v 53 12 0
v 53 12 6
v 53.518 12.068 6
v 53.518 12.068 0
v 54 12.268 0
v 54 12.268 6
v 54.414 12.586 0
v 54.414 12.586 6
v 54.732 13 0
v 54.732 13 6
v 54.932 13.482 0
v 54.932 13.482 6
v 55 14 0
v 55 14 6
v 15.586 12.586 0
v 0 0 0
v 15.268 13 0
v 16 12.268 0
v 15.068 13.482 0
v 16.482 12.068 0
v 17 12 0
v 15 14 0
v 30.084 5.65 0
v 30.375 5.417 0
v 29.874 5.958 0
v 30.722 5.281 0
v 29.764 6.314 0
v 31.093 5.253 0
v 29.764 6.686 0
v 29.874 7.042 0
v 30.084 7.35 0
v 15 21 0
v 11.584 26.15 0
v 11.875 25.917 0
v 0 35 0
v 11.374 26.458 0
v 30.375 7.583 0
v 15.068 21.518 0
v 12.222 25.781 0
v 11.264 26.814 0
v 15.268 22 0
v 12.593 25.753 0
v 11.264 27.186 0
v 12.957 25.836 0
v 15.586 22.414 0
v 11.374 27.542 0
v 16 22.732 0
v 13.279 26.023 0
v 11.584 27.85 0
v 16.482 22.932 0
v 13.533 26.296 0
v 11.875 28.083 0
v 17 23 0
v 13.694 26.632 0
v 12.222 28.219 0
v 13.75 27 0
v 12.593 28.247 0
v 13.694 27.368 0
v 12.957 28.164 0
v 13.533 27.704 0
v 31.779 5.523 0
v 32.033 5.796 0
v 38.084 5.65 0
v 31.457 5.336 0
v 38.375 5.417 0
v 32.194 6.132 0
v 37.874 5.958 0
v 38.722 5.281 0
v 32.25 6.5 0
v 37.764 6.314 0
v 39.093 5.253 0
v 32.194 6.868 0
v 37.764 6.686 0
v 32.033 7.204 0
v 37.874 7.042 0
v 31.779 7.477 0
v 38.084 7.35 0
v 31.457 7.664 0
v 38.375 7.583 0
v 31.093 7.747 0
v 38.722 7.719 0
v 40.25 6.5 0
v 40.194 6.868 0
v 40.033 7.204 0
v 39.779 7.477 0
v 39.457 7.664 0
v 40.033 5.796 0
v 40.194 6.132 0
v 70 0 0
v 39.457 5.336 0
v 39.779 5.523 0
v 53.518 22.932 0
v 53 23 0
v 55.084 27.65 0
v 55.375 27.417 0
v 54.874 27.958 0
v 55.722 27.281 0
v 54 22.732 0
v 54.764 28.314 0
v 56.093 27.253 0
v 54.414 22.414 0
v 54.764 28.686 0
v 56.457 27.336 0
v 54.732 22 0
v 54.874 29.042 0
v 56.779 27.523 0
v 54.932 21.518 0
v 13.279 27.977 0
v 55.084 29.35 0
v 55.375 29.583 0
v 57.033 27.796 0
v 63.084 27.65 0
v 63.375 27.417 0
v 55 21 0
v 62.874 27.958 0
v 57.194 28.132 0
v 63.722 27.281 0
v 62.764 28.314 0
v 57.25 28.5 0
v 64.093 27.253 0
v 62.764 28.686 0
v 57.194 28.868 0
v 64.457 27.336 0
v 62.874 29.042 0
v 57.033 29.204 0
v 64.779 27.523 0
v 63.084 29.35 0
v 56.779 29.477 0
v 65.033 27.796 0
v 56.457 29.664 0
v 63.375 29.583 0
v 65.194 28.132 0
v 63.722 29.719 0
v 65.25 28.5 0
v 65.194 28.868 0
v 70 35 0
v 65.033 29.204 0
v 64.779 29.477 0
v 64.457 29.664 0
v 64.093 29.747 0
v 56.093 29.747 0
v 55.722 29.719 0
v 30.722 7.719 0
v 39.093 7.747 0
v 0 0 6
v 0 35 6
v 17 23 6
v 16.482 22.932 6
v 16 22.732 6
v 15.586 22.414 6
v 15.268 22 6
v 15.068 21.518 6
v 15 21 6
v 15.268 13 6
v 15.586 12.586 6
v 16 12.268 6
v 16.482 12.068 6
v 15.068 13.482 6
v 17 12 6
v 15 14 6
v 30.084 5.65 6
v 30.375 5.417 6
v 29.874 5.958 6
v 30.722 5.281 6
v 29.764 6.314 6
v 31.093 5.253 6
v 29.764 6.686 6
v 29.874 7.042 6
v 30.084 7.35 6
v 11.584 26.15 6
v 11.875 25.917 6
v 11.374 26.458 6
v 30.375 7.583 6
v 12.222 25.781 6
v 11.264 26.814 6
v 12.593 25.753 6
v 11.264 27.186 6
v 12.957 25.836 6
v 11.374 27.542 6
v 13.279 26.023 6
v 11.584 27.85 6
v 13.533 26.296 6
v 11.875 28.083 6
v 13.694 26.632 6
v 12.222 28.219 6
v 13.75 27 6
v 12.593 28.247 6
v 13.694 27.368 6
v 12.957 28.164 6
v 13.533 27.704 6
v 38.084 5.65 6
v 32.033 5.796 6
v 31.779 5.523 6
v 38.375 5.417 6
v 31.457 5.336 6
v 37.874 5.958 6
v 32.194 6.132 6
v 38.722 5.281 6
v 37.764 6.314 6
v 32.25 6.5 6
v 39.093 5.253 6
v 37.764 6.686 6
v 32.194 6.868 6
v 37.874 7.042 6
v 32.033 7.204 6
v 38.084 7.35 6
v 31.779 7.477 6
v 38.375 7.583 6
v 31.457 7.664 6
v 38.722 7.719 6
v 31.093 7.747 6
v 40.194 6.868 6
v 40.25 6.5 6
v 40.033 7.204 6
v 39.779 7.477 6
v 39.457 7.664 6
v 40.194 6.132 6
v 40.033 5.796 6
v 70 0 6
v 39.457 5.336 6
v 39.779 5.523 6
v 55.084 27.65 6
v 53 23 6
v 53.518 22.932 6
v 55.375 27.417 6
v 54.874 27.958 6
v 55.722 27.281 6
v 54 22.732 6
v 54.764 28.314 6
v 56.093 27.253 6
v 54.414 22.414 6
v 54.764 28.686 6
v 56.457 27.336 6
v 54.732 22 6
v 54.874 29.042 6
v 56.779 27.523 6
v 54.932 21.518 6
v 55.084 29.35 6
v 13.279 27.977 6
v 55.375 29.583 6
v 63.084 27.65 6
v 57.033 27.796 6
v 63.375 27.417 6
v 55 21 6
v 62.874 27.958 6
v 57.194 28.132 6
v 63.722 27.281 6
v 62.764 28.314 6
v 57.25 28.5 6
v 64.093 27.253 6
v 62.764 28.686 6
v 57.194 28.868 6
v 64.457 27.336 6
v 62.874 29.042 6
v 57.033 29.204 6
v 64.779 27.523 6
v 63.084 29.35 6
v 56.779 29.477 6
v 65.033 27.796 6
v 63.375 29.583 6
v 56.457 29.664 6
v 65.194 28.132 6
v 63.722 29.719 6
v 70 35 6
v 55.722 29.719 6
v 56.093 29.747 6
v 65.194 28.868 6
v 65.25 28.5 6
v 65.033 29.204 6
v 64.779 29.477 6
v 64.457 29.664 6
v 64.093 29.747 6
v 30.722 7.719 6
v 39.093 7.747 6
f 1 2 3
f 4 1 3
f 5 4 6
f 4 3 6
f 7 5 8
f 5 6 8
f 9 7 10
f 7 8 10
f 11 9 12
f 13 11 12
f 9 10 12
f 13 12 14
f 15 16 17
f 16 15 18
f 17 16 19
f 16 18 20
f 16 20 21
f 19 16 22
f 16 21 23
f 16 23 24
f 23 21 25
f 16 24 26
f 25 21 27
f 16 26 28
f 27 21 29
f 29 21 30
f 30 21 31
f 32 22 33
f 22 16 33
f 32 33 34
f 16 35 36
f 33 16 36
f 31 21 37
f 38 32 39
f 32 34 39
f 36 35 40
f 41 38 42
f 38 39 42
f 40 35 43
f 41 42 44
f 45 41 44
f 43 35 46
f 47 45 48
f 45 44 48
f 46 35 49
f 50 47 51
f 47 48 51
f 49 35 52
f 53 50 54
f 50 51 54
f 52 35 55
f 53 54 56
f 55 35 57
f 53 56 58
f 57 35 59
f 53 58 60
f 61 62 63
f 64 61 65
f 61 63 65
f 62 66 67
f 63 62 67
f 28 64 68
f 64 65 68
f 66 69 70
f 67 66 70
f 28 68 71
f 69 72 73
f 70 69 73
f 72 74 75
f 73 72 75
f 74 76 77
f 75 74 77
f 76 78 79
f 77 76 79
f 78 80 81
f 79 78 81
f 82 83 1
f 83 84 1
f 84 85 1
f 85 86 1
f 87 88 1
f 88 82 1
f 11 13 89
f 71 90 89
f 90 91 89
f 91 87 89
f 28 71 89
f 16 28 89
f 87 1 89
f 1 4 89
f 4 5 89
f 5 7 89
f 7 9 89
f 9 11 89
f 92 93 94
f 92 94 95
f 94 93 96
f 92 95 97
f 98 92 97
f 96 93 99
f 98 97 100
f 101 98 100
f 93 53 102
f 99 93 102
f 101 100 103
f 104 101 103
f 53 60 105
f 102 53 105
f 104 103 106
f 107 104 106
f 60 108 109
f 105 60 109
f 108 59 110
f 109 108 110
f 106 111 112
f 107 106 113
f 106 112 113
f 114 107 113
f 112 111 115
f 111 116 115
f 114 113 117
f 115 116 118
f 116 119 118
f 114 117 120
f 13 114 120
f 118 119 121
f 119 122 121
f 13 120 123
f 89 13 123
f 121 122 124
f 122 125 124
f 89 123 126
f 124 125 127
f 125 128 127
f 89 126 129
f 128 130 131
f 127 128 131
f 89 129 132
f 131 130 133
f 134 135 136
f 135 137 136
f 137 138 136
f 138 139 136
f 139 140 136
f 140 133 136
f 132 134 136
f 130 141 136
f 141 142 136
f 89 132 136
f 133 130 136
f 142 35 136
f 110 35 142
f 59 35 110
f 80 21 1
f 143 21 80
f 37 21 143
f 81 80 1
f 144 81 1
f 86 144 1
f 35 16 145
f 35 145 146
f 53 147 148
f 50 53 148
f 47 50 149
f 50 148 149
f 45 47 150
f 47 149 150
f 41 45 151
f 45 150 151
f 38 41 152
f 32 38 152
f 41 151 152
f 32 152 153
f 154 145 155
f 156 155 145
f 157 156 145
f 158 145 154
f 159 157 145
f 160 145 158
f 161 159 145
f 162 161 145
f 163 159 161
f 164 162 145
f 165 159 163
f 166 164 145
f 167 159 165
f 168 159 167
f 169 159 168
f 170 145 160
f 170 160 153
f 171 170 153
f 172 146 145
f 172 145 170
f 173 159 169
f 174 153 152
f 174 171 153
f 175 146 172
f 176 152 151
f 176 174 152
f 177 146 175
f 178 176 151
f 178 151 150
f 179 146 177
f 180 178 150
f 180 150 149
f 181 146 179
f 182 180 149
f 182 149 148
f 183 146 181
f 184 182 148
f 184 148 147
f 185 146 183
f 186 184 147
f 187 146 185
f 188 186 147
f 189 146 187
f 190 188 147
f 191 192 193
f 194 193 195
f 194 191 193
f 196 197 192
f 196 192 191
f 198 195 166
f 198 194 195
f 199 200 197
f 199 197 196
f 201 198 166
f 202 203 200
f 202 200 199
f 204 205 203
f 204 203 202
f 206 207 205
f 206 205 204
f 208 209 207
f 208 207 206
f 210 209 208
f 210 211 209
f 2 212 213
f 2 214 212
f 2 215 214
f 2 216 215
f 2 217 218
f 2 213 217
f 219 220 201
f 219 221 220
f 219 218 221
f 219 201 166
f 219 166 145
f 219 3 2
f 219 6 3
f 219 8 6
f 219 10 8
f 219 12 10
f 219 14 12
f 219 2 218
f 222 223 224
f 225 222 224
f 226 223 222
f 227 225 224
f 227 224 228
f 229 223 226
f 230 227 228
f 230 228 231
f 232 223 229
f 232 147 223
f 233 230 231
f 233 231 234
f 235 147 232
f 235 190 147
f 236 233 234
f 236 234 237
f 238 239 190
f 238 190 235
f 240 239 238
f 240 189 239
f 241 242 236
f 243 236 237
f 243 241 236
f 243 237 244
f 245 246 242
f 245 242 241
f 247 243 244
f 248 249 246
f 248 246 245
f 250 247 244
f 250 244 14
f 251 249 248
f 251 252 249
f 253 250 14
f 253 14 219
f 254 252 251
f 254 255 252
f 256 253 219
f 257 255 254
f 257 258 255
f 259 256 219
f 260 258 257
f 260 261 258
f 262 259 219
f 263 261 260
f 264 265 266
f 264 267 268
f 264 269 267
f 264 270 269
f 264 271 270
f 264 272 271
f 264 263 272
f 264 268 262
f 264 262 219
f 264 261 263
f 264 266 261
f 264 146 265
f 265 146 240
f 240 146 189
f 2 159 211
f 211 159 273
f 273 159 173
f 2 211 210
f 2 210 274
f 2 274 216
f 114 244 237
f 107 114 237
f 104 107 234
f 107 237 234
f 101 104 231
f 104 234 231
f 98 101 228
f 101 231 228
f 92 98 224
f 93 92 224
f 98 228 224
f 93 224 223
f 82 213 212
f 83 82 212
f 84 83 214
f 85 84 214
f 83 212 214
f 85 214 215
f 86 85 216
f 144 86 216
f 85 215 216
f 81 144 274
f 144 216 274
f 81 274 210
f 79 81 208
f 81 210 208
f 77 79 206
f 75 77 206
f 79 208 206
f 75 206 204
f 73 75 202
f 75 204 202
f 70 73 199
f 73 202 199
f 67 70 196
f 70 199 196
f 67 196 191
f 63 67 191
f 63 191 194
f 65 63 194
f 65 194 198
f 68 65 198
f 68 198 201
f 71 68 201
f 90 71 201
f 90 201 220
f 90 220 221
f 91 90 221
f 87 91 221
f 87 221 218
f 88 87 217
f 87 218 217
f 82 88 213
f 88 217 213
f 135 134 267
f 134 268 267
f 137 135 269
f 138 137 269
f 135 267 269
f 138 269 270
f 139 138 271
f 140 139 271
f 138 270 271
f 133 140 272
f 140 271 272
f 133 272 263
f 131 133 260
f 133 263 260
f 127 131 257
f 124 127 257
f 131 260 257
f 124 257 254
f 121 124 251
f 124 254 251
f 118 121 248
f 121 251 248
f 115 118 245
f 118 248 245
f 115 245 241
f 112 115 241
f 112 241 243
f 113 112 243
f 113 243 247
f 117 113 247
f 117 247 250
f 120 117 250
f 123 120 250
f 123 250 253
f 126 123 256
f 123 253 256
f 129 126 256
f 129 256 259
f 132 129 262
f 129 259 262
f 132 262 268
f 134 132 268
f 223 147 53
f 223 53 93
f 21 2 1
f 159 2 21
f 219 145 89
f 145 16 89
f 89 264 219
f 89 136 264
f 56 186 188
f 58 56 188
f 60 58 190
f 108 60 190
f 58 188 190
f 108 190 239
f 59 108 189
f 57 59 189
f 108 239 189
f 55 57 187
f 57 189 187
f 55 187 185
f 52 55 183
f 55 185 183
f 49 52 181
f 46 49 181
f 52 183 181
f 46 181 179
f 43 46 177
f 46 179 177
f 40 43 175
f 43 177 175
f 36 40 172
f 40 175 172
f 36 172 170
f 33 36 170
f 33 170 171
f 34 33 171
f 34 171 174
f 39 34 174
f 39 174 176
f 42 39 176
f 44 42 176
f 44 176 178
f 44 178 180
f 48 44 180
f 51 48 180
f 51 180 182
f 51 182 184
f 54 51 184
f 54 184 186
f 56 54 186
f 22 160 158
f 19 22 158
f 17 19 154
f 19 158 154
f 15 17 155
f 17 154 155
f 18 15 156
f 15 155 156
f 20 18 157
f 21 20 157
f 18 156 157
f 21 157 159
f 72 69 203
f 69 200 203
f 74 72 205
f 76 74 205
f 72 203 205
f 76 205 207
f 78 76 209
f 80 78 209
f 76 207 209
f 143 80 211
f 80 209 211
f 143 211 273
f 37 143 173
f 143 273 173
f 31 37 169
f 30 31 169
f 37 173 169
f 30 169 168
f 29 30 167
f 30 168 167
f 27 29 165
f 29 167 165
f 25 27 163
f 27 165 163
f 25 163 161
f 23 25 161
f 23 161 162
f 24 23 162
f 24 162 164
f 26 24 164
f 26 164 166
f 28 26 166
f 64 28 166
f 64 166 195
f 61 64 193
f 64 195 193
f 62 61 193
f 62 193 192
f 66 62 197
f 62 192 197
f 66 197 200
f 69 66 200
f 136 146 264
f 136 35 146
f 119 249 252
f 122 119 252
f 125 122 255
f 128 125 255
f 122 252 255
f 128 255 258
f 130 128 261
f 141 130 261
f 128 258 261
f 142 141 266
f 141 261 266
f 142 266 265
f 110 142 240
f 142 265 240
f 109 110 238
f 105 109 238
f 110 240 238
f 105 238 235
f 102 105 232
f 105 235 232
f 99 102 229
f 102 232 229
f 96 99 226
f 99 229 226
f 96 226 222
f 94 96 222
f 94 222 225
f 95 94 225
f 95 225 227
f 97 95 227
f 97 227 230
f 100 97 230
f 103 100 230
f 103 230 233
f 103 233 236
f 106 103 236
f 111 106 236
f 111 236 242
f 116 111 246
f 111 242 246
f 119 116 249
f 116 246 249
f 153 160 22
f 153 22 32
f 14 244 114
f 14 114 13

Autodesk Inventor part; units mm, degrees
ref_plane "YZ Plane" through (0, 0, 0) normal (1, 0, 0) x (0, 1, 0)
ref_plane "XZ Plane" through (0, 0, 0) normal (0, 1, 0) x (-1, 0, 0)
ref_plane "XY Plane" through (0, 0, 0) normal (0, 0, 1) x (1, 0, 0)
ref_plane "작업 평면1" through (0, 0, 0) normal (0, 0, 1) x (1, 0, 0)
sketch "스케치1" plane through (0, 0, 0) normal (0, 0, 1) x (1, 0, 0)
  line L0 (0, 0) -> (6, 0) projected
  line L1 (6, 0) -> (6, 35) projected
  line L2 (0, 35) -> (6, 35) projected
  line L3 (0, 0) -> (0, 35) projected
  line L4 (0, 35) -> (70, 35)
  line L5 (70, 35) -> (70, 0)
  line L6 (70, 0) -> (0, 0)
  line L7 (0, 0) -> (0, 35)
  dimension "d4" = 0
  dimension "d0" = 70
extrude "돌출1" add sketch "스케치1" along normal blind 6
sketch "스케치2" plane through (0, 0, 6) normal (0, 0, 1) x (1, 0, 0)
  circle A0 centre (39, 6.5) radius 1.25 projected
  circle A1 centre (31, 6.5) radius 1.25 projected
  line L0 (25, 3) -> (45, 3) projected
  line L1 (45, 3) -> (45, 10) projected
  line L2 (45, 10) -> (25, 10) projected
  line L3 (25, 10) -> (25, 3) projected
  point P0 (0, 0)
extrude "돌출2" cut sketch "스케치2" against normal blind 6 contours A0 | A1
sketch "스케치3" plane through (0, 0, 6) normal (0, 0, 1) x (1, 0, 0)
  circle A0 centre (56, 28.5) radius 1.25 projected
  circle A1 centre (64, 28.5) radius 1.25 projected
  circle A2 centre (56, 28.5) radius 1.25 projected
  line L0 (50, 32) -> (70, 32) projected
  line L1 (70, 32) -> (70, 25) projected
  line L2 (70, 25) -> (50, 25) projected
  line L3 (50, 25) -> (50, 32) projected
  circle A3 centre (12.5, 27) radius 1.25 projected
  line L4 (9, 32) -> (16, 32) projected
  line L5 (16, 22) -> (16, 32) projected
  line L6 (9, 22) -> (16, 22) projected
  line L7 (9, 32) -> (9, 22) projected
  point P0 (0, 0)
extrude "돌출3" cut sketch "스케치3" against normal blind 6 contours A0 | A1 | A3
sketch "스케치4" plane through (0, 0, 6) normal (0, 0, 1) x (1, 0, 0)
  line L0 (15, 14) -> (15, 21) projected
  arc A0 (17, 23) -> (15, 21) centre (17, 21) ccw projected
  line L1 (17, 23) -> (53, 23) projected
  arc A1 (55, 21) -> (53, 23) centre (53, 21) ccw projected
  line L2 (55, 21) -> (55, 14) projected
  arc A2 (53, 12) -> (55, 14) centre (53, 14) ccw projected
  line L3 (53, 12) -> (17, 12) projected
  arc A3 (15, 14) -> (17, 12) centre (17, 14) ccw projected
  circle A4 centre (64, 28.5) radius 1.25 projected
  circle A5 centre (56, 28.5) radius 1.25 projected
  circle A6 centre (14, 27) radius 1.25 projected
  circle A7 centre (39, 6.5) radius 1.25 projected
  circle A8 centre (31, 6.5) radius 1.25 projected
  line L4 (0, 0) -> (70, 0) projected
  line L5 (70, 0) -> (70, 35) projected
  line L6 (70, 35) -> (0, 35) projected
  line L7 (0, 35) -> (0, 0) projected
  point P0 (0, 0)
extrude "돌출4" cut sketch "스케치4" against normal blind 6 contours L0 A0 L1 A1 L2 A2 L3 A3
properties part number "61" material "아크릴, 선명"
